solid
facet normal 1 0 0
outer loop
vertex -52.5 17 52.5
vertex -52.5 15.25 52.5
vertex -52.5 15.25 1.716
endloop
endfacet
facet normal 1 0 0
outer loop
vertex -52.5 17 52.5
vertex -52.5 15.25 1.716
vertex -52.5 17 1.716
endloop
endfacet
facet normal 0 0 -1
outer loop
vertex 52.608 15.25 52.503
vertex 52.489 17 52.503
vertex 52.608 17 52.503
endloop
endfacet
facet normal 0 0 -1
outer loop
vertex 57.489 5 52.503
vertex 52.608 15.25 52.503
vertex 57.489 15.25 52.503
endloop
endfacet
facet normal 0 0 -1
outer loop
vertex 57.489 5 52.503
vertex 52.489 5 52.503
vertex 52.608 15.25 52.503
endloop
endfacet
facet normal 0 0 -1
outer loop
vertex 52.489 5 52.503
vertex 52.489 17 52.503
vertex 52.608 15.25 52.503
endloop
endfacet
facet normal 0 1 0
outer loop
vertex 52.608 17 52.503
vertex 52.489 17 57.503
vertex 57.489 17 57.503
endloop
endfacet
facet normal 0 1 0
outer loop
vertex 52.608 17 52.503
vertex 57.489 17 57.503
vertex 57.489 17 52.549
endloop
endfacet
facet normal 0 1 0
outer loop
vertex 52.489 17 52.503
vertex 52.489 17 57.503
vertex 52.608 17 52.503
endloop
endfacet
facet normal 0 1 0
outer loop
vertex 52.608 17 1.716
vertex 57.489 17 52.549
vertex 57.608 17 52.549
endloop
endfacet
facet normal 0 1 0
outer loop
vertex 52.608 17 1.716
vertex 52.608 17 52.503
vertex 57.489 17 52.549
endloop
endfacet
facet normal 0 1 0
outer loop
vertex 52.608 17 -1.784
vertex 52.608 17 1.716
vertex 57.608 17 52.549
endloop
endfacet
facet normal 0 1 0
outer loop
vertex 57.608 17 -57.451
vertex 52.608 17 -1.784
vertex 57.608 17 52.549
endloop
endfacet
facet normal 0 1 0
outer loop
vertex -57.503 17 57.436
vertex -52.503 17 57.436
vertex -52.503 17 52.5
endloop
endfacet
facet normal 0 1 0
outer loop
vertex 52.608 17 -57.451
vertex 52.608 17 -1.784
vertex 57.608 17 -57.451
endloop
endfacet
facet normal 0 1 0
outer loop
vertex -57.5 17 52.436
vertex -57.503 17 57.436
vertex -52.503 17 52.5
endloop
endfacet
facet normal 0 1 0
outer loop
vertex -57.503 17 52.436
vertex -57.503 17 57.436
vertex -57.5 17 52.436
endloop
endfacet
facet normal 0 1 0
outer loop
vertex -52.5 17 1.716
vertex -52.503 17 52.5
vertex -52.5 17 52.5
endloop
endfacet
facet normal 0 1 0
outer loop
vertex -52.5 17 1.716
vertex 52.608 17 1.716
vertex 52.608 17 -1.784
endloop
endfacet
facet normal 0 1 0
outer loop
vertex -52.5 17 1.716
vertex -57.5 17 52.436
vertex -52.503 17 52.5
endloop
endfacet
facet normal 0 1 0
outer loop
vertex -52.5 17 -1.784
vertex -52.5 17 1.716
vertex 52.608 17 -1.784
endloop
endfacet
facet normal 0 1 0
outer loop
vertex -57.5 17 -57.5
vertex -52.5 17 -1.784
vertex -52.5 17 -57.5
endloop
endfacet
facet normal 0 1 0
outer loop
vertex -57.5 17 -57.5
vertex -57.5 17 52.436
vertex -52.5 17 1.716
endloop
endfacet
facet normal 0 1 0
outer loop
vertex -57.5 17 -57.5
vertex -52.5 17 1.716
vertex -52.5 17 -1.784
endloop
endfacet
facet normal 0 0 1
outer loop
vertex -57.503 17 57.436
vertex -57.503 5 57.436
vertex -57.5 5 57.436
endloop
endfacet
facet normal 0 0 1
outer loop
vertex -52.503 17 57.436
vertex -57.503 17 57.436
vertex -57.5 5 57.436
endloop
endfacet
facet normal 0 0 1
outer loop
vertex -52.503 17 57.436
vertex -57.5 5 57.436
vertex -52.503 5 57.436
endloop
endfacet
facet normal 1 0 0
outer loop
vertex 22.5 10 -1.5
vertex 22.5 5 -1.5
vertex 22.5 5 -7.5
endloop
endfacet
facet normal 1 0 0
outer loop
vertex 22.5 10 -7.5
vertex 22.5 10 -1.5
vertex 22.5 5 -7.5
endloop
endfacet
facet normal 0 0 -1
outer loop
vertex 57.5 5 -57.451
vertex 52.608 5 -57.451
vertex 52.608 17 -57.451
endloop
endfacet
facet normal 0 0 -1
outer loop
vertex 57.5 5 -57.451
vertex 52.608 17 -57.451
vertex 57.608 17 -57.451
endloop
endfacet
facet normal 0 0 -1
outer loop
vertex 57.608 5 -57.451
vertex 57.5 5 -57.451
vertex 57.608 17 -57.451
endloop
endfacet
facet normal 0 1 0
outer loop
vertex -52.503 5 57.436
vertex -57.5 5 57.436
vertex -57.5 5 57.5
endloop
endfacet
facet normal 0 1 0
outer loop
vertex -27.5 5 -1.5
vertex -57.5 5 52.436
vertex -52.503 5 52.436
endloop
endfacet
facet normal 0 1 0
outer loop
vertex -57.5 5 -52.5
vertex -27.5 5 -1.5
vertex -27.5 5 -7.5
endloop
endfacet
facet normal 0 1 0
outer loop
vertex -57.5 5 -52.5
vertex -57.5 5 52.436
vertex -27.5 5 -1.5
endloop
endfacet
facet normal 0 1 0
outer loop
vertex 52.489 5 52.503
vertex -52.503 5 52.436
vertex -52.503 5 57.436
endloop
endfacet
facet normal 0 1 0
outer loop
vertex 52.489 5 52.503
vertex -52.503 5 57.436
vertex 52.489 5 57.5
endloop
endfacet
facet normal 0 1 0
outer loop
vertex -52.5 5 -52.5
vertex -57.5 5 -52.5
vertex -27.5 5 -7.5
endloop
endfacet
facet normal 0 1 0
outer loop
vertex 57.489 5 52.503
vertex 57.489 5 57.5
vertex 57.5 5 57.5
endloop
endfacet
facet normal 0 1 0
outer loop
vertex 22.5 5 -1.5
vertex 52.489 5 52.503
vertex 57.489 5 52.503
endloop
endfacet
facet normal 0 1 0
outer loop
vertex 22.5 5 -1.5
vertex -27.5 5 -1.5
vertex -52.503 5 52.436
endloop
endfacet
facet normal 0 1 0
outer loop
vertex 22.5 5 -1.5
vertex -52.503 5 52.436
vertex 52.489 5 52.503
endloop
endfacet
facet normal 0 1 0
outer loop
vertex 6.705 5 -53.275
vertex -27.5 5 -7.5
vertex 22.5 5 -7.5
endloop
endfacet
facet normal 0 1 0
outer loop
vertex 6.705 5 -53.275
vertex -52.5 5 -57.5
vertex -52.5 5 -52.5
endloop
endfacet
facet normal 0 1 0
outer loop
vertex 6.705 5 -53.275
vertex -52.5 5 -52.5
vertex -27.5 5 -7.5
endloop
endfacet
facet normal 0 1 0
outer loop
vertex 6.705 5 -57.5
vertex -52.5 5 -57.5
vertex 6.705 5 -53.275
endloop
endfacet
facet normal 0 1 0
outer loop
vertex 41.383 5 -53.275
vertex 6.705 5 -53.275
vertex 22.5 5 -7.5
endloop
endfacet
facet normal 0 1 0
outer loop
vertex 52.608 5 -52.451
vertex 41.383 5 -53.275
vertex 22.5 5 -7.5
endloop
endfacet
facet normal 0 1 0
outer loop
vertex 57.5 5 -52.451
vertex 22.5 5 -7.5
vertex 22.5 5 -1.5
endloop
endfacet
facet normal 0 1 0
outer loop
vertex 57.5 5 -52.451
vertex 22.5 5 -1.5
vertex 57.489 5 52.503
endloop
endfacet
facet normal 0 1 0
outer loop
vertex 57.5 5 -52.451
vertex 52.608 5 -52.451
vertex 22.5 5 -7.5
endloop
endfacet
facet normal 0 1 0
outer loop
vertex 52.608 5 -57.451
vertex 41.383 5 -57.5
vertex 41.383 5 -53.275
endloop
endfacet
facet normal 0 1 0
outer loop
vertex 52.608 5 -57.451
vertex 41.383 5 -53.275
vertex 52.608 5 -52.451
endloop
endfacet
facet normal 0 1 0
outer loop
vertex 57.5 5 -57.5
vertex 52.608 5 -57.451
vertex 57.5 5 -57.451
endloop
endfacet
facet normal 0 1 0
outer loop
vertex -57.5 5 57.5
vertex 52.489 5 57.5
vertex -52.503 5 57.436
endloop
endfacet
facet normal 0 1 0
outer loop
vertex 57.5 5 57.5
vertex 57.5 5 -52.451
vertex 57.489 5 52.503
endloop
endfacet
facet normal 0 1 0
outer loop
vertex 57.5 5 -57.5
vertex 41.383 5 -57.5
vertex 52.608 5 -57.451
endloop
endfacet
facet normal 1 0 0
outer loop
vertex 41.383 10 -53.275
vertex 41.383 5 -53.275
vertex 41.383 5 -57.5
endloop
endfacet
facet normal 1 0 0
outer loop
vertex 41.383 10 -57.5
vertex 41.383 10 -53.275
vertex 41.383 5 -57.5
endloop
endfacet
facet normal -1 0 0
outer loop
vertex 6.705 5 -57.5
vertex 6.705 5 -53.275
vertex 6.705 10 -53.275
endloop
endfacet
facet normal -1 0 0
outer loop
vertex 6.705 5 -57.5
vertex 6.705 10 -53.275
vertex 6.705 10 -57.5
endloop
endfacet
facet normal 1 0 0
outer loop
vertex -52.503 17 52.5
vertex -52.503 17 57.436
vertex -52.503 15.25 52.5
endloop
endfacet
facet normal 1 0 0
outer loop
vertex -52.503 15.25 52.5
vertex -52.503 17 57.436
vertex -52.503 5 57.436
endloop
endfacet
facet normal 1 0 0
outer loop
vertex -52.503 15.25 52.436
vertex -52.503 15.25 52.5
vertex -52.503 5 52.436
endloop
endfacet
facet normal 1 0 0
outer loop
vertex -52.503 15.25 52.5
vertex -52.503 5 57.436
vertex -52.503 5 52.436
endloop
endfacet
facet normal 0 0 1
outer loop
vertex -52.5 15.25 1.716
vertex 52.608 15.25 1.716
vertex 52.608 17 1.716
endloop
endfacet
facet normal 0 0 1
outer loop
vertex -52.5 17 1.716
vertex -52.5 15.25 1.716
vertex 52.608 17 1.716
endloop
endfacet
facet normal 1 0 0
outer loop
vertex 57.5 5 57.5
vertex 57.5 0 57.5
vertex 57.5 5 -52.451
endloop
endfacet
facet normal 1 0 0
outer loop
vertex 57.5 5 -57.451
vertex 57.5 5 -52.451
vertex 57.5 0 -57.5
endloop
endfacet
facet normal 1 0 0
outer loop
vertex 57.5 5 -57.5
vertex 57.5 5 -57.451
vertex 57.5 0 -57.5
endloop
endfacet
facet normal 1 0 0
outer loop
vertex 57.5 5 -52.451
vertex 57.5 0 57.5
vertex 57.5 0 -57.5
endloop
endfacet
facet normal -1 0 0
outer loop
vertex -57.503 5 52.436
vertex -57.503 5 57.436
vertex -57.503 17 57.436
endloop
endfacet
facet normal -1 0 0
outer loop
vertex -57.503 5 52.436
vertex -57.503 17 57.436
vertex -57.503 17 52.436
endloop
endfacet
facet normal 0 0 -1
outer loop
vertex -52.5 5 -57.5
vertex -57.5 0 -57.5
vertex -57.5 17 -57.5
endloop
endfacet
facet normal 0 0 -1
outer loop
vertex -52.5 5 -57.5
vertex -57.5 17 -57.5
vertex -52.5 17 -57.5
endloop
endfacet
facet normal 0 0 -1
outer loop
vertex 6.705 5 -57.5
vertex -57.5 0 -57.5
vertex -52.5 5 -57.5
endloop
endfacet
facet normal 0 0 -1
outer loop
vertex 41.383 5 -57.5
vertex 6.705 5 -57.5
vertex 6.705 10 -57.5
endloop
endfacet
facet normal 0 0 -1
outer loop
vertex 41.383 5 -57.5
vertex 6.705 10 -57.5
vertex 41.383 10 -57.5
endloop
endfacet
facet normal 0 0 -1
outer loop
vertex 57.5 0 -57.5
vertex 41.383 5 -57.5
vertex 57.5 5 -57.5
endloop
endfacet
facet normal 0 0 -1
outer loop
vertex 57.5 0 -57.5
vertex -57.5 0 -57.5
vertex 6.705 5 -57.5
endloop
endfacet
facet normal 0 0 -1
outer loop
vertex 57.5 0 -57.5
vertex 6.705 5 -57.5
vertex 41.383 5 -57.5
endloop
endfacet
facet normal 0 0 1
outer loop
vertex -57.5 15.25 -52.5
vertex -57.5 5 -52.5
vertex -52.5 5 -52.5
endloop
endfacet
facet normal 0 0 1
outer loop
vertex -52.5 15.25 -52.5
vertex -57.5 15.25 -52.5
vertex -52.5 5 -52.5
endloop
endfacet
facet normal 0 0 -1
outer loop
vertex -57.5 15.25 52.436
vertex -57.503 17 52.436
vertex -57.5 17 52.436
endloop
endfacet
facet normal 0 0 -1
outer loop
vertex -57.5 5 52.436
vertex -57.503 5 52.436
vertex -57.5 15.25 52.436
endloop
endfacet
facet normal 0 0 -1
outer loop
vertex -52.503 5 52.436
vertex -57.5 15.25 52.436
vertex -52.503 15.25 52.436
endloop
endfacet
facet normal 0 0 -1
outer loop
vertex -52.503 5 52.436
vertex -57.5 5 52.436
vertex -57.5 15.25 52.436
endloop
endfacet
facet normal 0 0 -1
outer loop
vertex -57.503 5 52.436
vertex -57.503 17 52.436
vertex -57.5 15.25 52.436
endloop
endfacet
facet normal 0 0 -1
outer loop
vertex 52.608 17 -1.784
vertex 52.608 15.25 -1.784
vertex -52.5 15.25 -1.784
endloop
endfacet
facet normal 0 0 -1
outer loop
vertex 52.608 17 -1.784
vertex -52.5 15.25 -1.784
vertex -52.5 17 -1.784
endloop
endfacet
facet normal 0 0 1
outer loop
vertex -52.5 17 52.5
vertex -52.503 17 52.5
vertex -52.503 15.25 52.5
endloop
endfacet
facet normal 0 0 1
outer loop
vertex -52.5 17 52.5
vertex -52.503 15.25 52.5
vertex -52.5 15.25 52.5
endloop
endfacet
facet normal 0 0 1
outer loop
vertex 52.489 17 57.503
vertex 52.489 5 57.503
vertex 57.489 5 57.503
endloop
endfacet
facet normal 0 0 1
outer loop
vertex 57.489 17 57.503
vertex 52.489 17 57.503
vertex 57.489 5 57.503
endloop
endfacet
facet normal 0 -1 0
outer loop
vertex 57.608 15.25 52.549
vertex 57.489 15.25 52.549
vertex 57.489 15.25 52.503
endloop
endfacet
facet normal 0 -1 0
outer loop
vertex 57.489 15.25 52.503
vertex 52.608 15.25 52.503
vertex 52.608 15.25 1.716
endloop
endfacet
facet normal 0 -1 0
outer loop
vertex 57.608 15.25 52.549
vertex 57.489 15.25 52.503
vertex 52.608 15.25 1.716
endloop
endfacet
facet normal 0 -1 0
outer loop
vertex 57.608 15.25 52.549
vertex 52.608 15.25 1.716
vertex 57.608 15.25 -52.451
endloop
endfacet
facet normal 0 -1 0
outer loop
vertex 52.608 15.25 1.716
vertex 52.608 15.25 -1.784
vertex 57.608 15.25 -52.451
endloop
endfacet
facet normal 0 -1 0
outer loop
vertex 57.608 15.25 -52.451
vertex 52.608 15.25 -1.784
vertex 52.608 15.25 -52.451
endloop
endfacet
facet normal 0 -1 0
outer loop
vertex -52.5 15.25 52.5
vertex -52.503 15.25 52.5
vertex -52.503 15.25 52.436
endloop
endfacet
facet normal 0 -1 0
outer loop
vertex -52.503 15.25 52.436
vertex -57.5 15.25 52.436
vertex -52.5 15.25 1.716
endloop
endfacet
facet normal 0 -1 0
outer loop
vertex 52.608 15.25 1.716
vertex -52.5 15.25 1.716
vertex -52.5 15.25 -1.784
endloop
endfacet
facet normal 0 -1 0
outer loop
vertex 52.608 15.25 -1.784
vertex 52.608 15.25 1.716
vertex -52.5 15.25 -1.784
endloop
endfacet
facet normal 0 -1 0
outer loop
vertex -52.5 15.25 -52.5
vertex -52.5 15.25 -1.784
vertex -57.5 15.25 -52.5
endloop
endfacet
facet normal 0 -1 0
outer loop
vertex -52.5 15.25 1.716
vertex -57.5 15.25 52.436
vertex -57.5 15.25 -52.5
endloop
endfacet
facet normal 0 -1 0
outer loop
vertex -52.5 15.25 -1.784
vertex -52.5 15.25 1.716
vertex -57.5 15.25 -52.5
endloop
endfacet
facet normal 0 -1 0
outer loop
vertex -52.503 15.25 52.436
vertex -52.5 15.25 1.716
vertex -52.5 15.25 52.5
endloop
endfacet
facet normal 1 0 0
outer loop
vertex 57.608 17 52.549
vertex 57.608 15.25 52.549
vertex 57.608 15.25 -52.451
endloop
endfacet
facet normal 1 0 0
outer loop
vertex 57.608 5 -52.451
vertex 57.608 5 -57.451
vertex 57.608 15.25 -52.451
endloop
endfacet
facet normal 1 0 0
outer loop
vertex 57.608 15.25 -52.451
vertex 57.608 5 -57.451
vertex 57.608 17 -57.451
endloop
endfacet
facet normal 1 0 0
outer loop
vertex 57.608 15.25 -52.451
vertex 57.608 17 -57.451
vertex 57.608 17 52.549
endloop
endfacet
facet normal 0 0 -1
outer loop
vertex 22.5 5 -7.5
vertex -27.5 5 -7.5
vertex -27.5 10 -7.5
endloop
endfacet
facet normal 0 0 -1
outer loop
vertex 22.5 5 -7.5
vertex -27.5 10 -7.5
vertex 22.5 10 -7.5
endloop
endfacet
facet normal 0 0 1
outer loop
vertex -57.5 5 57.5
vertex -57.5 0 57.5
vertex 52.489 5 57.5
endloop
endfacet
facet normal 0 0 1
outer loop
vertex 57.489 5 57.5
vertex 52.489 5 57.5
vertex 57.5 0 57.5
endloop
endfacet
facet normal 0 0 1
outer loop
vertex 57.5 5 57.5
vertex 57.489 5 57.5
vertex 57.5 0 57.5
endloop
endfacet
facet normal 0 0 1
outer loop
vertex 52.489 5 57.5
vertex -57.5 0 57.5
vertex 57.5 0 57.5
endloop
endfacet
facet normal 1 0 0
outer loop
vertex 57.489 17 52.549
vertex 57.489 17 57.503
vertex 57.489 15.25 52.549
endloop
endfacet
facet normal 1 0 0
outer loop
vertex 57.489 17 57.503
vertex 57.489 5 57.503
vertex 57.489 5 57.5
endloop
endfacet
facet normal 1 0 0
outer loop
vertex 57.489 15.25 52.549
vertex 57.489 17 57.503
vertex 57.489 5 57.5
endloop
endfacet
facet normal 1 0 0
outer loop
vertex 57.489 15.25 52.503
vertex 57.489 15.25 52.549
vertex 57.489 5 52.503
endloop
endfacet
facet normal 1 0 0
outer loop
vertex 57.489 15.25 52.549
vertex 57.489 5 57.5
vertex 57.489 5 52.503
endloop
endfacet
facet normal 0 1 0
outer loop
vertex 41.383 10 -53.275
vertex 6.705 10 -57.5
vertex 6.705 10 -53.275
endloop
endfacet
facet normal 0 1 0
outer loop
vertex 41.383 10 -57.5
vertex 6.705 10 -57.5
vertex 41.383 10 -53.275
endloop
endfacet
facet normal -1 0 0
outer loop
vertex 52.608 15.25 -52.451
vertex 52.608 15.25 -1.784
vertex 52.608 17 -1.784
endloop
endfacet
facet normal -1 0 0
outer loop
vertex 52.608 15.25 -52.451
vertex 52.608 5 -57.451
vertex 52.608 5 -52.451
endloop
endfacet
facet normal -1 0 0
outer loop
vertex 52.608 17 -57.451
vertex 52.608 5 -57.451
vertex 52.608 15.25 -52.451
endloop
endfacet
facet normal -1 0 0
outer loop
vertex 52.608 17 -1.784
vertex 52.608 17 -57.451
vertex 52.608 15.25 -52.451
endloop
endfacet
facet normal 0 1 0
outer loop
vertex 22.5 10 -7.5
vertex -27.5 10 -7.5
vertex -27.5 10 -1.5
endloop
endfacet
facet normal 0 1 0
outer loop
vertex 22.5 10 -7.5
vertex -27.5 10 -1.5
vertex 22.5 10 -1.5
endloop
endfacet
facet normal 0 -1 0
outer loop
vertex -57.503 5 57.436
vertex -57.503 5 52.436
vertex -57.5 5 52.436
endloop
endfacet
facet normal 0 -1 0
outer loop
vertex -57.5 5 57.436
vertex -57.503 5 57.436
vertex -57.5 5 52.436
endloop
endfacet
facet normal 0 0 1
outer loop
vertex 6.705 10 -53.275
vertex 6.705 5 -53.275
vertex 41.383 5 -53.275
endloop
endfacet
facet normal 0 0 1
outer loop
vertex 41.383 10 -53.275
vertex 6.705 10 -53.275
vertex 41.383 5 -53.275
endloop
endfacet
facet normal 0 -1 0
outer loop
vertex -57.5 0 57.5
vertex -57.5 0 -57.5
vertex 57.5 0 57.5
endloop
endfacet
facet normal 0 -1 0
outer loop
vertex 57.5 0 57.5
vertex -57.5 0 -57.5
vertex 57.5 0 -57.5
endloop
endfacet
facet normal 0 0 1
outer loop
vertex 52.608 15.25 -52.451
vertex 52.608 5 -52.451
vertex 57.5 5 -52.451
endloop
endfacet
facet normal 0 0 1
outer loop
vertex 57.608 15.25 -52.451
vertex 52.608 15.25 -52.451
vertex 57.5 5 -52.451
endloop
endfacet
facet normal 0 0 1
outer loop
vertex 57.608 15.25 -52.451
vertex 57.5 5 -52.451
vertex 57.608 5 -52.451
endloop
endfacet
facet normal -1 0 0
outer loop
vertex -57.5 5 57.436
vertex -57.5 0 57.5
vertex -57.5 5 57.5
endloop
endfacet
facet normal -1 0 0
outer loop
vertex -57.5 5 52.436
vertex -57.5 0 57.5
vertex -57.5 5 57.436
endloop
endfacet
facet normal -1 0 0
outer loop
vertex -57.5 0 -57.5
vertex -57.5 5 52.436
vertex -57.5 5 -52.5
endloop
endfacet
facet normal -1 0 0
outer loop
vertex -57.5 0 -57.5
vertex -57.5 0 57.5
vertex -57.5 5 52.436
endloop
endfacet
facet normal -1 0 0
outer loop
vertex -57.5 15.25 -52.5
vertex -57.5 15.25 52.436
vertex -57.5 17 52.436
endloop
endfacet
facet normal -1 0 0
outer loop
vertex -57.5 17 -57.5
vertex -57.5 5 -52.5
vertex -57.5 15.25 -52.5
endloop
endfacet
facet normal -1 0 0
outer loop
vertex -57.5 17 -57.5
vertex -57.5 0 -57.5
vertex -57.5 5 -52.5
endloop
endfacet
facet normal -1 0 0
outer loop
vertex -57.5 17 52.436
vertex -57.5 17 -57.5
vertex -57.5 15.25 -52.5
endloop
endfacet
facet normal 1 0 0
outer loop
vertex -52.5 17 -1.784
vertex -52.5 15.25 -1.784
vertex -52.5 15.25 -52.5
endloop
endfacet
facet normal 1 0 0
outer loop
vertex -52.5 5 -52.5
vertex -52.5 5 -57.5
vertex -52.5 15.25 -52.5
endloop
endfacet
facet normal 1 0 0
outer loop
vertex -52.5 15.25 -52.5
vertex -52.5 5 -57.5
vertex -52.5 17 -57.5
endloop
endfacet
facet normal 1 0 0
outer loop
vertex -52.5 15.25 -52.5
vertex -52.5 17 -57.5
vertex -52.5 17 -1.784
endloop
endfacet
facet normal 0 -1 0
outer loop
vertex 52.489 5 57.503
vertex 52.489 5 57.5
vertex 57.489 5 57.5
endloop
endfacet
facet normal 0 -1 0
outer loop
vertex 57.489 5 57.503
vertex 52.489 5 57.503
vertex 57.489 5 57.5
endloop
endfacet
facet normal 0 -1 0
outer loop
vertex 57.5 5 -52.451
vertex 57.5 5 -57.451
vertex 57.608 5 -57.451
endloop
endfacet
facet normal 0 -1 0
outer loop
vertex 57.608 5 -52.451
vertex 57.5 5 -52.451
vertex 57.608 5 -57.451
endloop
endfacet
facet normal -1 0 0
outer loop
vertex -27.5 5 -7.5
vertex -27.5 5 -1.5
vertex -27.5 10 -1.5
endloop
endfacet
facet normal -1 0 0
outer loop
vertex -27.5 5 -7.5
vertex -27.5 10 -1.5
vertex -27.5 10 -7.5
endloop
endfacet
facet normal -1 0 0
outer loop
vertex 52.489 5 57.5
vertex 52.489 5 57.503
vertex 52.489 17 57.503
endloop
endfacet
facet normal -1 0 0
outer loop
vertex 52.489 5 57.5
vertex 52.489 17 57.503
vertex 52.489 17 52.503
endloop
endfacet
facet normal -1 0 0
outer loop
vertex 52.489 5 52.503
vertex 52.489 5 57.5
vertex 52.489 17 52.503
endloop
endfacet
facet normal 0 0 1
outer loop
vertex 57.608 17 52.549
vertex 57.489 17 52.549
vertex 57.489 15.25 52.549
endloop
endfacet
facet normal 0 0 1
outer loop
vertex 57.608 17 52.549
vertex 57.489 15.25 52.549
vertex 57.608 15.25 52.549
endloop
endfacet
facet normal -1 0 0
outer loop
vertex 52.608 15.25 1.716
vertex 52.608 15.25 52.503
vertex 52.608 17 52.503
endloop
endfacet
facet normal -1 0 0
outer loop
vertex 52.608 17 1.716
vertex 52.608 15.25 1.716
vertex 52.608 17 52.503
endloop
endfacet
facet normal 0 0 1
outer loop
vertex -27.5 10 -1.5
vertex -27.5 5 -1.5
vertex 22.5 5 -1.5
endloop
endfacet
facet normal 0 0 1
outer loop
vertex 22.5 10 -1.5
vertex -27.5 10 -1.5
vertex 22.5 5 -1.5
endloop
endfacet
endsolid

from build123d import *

# Parameters (mm, degrees)
SKETCH1_W            = 115
SKETCH1_H            = 115
BOSS_EXTRUDE3_DEPTH  = 5
SKETCH5_W            = 50
SKETCH5_H            = 6
SKETCH5_W_2          = 34.678216068
SKETCH5_H_2          = 4.225459606
BOSS_EXTRUDE4_DEPTH  = 5
SKETCH6_W            = 5
SKETCH6_H            = 5
BOSS_EXTRUDE5_DEPTH  = 12
SKETCH8_W            = 5
SKETCH8_H            = 1.75
BOSS_EXTRUDE7_DEPTH  = 105
SKETCH9_W            = 5
SKETCH9_H            = 1.75
BOSS_EXTRUDE8_DEPTH  = 105
SKETCH11_W           = 3.5
SKETCH11_H           = 1.75
BOSS_EXTRUDE10_DEPTH = 108


with BuildPart() as part:
    # Sketch1 → Boss-Extrude3 (new body)
    with BuildSketch(Plane(origin=(0, 0, 0), x_dir=(1, 0, 0), z_dir=(0, 1, 0))):
        Rectangle(SKETCH1_W, SKETCH1_H)
    extrude(amount=BOSS_EXTRUDE3_DEPTH)

    # Sketch5 → Boss-Extrude4 (add)
    with BuildSketch(Plane(origin=(0, 5, 0), x_dir=(1, 0, 0), z_dir=(0, 1, 0))):
        with Locations((-2.5, 4.5)):
            Rectangle(SKETCH5_W, SKETCH5_H)
        with Locations((24.044261594, 55.387270197)):
            Rectangle(SKETCH5_W_2, SKETCH5_H_2)
    extrude(amount=BOSS_EXTRUDE4_DEPTH)

    # Sketch6 → Boss-Extrude5 (add)
    with BuildSketch(Plane(origin=(0, 5, 0), x_dir=(1, 0, 0), z_dir=(0, 1, 0))):
        with Locations((-55.003212796, -54.936396199)):
            Rectangle(SKETCH6_W, SKETCH6_H)
        with Locations((-55, 55)):
            Rectangle(SKETCH6_W, SKETCH6_H)
        with Locations((55.107980821, 54.950828784)):
            Rectangle(SKETCH6_W, SKETCH6_H)
        with Locations((54.988780211, -55.003212796)):
            Rectangle(SKETCH6_W, SKETCH6_H)
    extrude(amount=BOSS_EXTRUDE5_DEPTH)

    # Sketch8 → Boss-Extrude7 (add)
    with BuildSketch(Plane.XY.offset(-52.5)):
        with Locations((-55, 16.125)):
            Rectangle(SKETCH8_W, SKETCH8_H)
    extrude(amount=BOSS_EXTRUDE7_DEPTH)

    # Sketch9 → Boss-Extrude8 (add)
    with BuildSketch(Plane.XY.offset(-52.450828784)):
        with Locations((55.107980821, 16.125)):
            Rectangle(SKETCH9_W, SKETCH9_H)
    extrude(amount=BOSS_EXTRUDE8_DEPTH)

    # Sketch11 → Boss-Extrude10 (add)
    with BuildSketch(Plane(origin=(-52.5, 0, 0), x_dir=(0, 0, -1), z_dir=(1, 0, 0))):
        with Locations((0.033603801, 16.125)):
            Rectangle(SKETCH11_W, SKETCH11_H)
    extrude(amount=BOSS_EXTRUDE10_DEPTH)


solid = part.part
